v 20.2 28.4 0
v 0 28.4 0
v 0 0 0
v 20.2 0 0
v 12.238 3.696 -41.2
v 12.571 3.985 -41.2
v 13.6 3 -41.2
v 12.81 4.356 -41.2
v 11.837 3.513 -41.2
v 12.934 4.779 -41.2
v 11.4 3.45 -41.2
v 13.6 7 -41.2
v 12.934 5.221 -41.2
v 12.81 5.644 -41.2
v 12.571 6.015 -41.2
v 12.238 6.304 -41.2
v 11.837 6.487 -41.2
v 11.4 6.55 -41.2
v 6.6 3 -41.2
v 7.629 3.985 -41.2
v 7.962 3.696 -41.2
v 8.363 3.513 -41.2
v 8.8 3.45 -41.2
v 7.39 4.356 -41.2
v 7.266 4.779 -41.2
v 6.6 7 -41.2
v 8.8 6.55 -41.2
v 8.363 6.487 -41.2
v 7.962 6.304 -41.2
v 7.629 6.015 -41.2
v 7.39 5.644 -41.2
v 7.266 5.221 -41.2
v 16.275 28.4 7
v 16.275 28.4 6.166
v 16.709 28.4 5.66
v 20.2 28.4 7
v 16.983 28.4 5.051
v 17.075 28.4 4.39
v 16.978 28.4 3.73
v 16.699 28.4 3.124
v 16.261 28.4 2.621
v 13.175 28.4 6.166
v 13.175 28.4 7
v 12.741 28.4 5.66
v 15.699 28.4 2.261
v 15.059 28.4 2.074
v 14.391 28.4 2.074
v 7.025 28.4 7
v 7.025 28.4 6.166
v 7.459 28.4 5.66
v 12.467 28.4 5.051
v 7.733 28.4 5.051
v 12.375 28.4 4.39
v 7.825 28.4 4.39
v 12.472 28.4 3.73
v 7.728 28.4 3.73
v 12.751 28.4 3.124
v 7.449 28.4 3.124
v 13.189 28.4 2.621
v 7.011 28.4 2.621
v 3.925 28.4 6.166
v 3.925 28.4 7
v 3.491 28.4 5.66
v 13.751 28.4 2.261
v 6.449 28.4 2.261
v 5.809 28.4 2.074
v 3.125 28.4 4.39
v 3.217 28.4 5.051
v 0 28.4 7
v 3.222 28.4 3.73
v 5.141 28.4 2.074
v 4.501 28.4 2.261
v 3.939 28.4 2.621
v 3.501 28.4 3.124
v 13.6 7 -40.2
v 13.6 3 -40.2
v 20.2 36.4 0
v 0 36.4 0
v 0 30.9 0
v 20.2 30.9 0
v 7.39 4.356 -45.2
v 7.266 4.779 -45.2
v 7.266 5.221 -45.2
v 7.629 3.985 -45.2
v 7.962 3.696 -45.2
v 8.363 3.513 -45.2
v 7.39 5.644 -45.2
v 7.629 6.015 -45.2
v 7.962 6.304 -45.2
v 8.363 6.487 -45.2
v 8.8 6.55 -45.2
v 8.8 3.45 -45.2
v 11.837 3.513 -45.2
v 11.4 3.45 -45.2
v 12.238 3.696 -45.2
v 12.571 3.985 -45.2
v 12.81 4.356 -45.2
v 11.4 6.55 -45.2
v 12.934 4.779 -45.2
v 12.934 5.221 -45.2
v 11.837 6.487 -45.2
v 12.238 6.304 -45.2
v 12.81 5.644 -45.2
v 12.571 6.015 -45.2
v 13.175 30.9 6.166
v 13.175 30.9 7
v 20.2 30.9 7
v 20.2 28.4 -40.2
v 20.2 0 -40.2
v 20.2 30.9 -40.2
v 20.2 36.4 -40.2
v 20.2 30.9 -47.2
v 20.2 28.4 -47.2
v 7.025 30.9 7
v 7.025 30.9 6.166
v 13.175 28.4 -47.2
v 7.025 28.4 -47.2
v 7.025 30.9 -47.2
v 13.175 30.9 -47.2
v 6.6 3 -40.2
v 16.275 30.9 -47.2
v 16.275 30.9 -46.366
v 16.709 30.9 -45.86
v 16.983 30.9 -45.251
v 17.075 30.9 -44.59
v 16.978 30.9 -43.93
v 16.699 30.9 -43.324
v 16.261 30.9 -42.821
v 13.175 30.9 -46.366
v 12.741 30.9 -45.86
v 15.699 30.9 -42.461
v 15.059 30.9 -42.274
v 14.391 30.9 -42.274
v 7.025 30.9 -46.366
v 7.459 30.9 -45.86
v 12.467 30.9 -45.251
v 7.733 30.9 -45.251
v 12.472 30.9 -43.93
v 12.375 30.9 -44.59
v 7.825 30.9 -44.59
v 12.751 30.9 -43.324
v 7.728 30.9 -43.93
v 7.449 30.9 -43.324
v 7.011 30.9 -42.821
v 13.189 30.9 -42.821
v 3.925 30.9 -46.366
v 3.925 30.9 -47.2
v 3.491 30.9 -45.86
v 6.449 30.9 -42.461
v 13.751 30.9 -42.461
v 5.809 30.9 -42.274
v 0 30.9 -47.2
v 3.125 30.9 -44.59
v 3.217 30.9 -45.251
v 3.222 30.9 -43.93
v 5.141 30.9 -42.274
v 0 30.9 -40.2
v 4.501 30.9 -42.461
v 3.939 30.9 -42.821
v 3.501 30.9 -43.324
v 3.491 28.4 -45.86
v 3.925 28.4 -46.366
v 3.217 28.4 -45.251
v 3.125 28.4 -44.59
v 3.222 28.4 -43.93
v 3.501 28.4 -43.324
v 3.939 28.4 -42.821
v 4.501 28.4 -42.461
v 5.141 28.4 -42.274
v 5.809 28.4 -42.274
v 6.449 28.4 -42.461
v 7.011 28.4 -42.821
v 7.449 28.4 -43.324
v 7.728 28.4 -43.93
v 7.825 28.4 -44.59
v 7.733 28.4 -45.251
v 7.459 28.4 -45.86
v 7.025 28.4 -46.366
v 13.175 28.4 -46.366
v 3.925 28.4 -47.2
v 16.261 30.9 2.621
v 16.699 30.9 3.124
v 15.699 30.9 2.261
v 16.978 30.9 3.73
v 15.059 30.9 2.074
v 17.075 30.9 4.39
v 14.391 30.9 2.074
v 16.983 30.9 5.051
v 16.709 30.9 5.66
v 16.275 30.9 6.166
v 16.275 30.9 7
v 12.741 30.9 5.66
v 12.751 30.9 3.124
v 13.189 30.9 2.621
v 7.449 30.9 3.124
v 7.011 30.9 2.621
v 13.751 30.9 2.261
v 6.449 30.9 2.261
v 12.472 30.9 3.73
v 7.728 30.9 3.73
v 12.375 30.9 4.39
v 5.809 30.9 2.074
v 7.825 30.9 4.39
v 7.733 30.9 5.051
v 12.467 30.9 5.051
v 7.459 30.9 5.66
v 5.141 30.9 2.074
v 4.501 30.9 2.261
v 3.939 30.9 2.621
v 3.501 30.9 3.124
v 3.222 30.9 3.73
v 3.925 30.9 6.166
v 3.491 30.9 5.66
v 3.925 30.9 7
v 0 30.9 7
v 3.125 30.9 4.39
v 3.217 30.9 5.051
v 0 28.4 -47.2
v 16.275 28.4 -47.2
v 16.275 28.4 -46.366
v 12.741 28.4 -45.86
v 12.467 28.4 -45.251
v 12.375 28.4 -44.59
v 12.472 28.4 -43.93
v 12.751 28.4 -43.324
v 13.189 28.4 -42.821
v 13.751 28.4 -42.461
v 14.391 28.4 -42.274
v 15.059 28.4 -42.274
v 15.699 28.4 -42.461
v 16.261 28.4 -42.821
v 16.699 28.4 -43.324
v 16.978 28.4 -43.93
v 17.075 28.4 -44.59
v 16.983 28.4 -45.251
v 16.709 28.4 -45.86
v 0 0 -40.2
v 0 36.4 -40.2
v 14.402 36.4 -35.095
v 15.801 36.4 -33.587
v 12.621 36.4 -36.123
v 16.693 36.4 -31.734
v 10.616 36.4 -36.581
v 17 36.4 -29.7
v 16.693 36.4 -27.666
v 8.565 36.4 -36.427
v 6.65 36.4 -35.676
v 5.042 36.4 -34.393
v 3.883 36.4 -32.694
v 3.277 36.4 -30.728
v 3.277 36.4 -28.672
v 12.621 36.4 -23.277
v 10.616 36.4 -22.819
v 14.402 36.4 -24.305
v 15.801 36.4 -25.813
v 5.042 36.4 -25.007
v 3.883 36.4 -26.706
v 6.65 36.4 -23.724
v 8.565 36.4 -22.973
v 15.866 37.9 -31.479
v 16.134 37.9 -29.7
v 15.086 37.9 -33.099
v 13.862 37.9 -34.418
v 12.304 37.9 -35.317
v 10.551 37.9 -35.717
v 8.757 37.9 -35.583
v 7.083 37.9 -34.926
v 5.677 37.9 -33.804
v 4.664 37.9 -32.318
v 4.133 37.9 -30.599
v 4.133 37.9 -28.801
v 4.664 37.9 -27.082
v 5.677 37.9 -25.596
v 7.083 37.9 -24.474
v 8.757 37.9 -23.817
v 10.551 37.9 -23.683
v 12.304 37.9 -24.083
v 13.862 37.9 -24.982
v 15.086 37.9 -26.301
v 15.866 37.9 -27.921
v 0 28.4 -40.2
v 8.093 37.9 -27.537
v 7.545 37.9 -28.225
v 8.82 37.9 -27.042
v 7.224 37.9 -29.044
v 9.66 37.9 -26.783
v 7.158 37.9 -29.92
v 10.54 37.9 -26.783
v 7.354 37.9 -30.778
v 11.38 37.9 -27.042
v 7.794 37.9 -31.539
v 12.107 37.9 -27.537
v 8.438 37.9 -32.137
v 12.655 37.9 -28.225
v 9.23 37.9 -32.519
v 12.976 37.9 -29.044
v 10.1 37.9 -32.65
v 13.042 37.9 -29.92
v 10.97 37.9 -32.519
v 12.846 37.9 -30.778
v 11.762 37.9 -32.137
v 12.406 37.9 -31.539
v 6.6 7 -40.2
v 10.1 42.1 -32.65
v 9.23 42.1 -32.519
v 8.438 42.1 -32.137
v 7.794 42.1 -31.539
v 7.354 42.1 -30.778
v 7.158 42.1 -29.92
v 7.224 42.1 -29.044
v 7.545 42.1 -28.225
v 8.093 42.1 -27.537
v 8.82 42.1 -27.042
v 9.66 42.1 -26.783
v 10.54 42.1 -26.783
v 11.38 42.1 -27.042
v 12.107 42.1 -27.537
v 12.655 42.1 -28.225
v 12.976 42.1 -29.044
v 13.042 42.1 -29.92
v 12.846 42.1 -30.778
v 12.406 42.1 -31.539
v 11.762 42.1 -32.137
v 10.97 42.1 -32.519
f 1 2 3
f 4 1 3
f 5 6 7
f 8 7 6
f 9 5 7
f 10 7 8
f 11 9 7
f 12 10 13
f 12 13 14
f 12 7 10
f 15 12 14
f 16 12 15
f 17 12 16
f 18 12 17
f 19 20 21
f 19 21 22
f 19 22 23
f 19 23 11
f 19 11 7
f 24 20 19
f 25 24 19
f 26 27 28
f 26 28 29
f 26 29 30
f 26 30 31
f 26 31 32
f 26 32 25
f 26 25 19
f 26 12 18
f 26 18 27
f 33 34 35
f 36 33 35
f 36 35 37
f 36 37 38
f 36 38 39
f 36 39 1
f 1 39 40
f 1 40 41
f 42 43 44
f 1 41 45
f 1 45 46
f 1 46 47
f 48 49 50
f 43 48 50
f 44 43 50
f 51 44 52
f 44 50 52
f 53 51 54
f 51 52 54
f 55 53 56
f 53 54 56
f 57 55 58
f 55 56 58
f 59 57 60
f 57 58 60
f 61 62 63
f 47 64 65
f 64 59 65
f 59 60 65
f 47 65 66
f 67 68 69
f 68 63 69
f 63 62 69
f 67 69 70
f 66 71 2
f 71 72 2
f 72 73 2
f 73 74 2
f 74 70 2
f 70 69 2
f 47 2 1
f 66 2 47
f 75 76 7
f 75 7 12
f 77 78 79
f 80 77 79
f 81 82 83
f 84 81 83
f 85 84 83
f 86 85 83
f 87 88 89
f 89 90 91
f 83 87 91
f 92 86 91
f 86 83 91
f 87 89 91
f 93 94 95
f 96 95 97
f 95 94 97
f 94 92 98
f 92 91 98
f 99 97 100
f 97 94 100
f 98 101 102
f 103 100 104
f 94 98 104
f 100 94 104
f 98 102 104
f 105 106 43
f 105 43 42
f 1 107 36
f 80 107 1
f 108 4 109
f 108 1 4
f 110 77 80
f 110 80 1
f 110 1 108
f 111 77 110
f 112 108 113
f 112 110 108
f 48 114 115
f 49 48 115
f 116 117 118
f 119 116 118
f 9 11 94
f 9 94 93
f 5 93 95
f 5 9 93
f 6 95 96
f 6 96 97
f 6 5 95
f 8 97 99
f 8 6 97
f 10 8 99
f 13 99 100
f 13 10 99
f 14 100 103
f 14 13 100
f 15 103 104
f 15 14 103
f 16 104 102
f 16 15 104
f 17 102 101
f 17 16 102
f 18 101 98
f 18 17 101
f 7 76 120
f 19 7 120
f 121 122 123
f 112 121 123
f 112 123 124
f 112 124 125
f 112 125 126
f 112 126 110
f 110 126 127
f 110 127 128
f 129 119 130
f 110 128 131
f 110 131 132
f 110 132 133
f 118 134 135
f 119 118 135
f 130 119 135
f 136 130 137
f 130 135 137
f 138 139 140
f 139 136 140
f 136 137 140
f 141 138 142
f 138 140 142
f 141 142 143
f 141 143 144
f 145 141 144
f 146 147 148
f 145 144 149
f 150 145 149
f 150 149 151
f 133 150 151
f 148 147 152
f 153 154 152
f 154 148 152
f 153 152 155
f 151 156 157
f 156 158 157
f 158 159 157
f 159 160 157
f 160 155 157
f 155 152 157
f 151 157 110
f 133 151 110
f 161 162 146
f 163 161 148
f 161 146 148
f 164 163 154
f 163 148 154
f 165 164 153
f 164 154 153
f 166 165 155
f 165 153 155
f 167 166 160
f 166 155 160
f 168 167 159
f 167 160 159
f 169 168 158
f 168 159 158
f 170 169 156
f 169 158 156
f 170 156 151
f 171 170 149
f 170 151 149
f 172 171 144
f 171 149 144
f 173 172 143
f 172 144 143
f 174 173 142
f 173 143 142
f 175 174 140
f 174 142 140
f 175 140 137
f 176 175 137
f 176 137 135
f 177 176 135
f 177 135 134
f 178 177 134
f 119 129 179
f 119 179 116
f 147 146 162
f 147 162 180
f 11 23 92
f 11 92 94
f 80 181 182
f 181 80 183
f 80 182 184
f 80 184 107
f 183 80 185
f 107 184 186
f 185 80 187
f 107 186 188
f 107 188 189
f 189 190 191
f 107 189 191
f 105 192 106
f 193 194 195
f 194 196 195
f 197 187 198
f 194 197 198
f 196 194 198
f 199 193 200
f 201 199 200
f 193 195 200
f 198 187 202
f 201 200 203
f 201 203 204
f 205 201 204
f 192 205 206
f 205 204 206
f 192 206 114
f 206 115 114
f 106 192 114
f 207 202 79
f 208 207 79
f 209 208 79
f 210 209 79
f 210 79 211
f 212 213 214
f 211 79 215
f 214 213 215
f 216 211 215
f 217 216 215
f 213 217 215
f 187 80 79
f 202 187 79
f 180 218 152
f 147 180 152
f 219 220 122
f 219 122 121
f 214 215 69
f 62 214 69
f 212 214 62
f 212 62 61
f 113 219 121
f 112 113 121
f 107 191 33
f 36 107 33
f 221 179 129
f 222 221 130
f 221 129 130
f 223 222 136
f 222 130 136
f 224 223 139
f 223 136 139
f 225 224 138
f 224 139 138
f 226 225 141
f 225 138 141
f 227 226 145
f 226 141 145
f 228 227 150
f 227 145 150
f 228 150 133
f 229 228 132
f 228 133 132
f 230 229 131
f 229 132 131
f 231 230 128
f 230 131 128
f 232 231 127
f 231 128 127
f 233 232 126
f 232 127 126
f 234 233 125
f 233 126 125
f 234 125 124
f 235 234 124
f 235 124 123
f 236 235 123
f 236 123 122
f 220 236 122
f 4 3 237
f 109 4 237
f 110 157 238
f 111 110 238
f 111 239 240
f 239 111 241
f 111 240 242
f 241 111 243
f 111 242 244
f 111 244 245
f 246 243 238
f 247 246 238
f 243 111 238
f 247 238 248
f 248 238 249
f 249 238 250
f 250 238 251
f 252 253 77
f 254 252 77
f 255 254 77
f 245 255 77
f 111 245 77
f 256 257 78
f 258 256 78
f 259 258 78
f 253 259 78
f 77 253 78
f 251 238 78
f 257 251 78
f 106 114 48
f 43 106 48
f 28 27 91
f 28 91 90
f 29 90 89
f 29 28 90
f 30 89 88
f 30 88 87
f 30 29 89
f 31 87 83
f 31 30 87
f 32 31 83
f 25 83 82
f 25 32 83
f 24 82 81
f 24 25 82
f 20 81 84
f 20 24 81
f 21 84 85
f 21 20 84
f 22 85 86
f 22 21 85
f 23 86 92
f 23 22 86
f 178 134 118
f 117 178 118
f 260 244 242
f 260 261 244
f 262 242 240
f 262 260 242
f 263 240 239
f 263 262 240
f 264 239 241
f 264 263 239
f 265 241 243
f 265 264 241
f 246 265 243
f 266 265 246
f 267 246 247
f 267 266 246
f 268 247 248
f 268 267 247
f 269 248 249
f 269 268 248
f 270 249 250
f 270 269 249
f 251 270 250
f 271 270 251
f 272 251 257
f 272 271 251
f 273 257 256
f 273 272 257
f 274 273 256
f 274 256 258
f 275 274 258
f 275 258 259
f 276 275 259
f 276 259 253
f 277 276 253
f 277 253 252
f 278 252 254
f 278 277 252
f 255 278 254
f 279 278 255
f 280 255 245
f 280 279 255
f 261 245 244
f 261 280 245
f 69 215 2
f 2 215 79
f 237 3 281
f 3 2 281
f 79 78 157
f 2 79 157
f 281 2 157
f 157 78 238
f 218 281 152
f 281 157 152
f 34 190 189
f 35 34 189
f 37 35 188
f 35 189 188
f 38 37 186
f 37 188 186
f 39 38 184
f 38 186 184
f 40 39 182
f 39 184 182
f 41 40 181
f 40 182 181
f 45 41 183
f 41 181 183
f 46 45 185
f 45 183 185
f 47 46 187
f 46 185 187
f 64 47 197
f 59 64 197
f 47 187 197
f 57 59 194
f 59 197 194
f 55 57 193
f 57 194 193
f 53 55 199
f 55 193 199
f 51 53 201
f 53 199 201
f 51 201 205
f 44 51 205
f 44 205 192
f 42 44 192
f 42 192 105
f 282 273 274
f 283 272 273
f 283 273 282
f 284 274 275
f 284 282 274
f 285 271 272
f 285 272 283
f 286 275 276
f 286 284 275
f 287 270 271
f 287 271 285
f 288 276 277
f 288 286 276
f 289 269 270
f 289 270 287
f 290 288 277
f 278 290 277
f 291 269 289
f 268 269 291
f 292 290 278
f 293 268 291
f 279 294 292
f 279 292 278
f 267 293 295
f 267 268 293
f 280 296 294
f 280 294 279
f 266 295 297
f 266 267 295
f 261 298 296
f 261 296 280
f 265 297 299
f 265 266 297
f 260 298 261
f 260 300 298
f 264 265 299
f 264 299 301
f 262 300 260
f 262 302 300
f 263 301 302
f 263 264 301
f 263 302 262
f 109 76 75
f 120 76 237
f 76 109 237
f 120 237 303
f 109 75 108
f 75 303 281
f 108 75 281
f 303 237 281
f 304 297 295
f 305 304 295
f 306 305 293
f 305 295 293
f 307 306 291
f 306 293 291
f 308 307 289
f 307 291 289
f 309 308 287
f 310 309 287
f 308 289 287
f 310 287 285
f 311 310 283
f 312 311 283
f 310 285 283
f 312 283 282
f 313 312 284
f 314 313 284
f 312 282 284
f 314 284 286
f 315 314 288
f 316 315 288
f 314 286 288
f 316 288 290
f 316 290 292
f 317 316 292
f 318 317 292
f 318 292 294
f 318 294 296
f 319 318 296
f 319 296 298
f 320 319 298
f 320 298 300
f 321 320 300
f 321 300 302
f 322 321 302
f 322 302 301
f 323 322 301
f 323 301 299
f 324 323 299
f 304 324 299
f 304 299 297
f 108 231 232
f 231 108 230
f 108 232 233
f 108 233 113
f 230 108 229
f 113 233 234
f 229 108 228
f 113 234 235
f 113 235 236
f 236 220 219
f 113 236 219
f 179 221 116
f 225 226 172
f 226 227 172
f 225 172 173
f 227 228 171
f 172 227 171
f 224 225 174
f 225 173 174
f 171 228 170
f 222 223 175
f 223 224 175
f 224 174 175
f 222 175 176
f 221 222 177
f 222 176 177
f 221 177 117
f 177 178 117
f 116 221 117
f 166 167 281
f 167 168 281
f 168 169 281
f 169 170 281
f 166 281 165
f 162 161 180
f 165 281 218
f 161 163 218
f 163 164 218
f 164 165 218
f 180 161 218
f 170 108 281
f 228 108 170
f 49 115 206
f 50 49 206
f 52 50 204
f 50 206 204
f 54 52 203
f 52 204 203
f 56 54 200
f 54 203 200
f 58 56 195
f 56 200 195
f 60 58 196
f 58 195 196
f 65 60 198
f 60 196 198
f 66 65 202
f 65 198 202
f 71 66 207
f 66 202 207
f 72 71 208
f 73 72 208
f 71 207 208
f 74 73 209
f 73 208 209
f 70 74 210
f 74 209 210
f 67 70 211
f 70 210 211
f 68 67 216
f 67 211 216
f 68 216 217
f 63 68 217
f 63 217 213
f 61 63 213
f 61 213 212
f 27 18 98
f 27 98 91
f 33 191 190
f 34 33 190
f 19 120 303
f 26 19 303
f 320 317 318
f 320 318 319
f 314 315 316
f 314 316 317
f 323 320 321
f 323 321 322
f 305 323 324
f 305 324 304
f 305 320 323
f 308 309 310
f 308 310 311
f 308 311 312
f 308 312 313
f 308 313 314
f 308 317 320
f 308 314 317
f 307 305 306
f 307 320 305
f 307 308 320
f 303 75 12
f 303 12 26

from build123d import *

# Parameters (mm, degrees)
BOSS_EXTRU_1_DEPTH      = 20.2
ESQUISSE2_R             = 2.35
ENL_V_MAT_EXTRU_1_DEPTH = 60.922366442
ESQUISSE8_W             = 3.1
ESQUISSE8_H             = 3.49339615
ENL_V_MAT_EXTRU_2_DEPTH = 10
ESQUISSE3_R             = 2.95
BOSS_EXTRU_2_DEPTH      = 5.7
ESQUISSE5_R             = 6.9
BOSS_EXTRU_4_DEPTH      = 1.5
BOSS_EXTRU_4_TAPER      = 30
ESQUISSE6_W             = 7
ESQUISSE6_H             = 4
BOSS_EXTRU_5_DEPTH      = 1
BOSS_EXTRU_6_DEPTH      = 4


with BuildPart() as part:
    # Esquisse1 → Boss.-Extru.1 (new body)
    with BuildSketch(Plane(origin=(0, 0, 0), x_dir=(0, 0, -1), z_dir=(1, 0, 0))):
        Polygon((0, 0), (40.2, 0), (40.2, 28.4), (47.2, 28.4), (47.2, 30.9), (40.2, 30.9), (40.2, 36.4), (0, 36.4), (0, 30.9), (-7, 30.9), (-7, 28.4), (0, 28.4), align=None)
    extrude(amount=BOSS_EXTRU_1_DEPTH)

    # Esquisse2 → Enlèv. mat.-Extru.1 (cut, through all)
    with BuildSketch(Plane(origin=(0, 30.9, 0), x_dir=(1, 0, 0), z_dir=(0, 1, 0))):
        with Locations(Location((5.475, 44.6, 0), (0, 0, 270))):
            Circle(ESQUISSE2_R)
        with Locations(Location((14.725, 44.6, 0), (0, 0, 270))):
            Circle(ESQUISSE2_R)
        with Locations(Location((14.725, -4.4, 0), (0, 0, 270))):
            Circle(ESQUISSE2_R)
        with Locations(Location((5.475, -4.4, 0), (0, 0, 270))):
            Circle(ESQUISSE2_R)
    extrude(amount=-ENL_V_MAT_EXTRU_1_DEPTH, mode=Mode.SUBTRACT)

    # Esquisse8 → Enlèv. mat.-Extru.2 (cut)
    with BuildSketch(Plane(origin=(0, 30.9, 0), x_dir=(1, 0, 0), z_dir=(0, 1, 0))):
        with Locations((5.475, 46.933629306)):
            Rectangle(ESQUISSE8_W, ESQUISSE8_H)
        with Locations((14.725, 46.933629306)):
            Rectangle(ESQUISSE8_W, ESQUISSE8_H)
        with Locations((14.725, -6.733629306)):
            Rectangle(ESQUISSE8_W, ESQUISSE8_H)
        with Locations((5.475, -6.733629306)):
            Rectangle(ESQUISSE8_W, ESQUISSE8_H)
    extrude(amount=-ENL_V_MAT_EXTRU_2_DEPTH, mode=Mode.SUBTRACT)

    # Esquisse3 → Boss.-Extru.2 (add)
    with BuildSketch(Plane(origin=(0, 36.4, 0), x_dir=(1, 0, 0), z_dir=(0, 1, 0))):
        with Locations(Location((10.1, 29.7, 0), (0, 0, 90))):
            Circle(ESQUISSE3_R)
    extrude(amount=BOSS_EXTRU_2_DEPTH)

    # Esquisse5 → Boss.-Extru.4 (add)
    with BuildSketch(Plane(origin=(0, 36.4, 0), x_dir=(1, 0, 0), z_dir=(0, 1, 0))):
        with Locations((10.1, 29.7)):
            Circle(ESQUISSE5_R)
    extrude(amount=BOSS_EXTRU_4_DEPTH, taper=BOSS_EXTRU_4_TAPER)

    # Esquisse6 → Boss.-Extru.5 (add)
    with BuildSketch(Plane(origin=(0, 0, -40.2), x_dir=(-1, 0, 0), z_dir=(0, 0, -1))):
        with Locations((-10.1, 5)):
            Rectangle(ESQUISSE6_W, ESQUISSE6_H)
    extrude(amount=BOSS_EXTRU_5_DEPTH)

    # Esquisse7 → Boss.-Extru.6 (add)
    with BuildSketch(Plane(origin=(0, 0, -41.2), x_dir=(-1, 0, 0), z_dir=(0, 0, -1))):
        with BuildLine():
            Line((-11.4, 6.55), (-8.8, 6.55))
            ThreePointArc((-8.8, 6.55), (-7.25, 5), (-8.8, 3.45))
            Line((-8.8, 3.45), (-11.4, 3.45))
            ThreePointArc((-11.4, 3.45), (-12.95, 5), (-11.4, 6.55))
        make_face()
    extrude(amount=BOSS_EXTRU_6_DEPTH)


solid = part.part
